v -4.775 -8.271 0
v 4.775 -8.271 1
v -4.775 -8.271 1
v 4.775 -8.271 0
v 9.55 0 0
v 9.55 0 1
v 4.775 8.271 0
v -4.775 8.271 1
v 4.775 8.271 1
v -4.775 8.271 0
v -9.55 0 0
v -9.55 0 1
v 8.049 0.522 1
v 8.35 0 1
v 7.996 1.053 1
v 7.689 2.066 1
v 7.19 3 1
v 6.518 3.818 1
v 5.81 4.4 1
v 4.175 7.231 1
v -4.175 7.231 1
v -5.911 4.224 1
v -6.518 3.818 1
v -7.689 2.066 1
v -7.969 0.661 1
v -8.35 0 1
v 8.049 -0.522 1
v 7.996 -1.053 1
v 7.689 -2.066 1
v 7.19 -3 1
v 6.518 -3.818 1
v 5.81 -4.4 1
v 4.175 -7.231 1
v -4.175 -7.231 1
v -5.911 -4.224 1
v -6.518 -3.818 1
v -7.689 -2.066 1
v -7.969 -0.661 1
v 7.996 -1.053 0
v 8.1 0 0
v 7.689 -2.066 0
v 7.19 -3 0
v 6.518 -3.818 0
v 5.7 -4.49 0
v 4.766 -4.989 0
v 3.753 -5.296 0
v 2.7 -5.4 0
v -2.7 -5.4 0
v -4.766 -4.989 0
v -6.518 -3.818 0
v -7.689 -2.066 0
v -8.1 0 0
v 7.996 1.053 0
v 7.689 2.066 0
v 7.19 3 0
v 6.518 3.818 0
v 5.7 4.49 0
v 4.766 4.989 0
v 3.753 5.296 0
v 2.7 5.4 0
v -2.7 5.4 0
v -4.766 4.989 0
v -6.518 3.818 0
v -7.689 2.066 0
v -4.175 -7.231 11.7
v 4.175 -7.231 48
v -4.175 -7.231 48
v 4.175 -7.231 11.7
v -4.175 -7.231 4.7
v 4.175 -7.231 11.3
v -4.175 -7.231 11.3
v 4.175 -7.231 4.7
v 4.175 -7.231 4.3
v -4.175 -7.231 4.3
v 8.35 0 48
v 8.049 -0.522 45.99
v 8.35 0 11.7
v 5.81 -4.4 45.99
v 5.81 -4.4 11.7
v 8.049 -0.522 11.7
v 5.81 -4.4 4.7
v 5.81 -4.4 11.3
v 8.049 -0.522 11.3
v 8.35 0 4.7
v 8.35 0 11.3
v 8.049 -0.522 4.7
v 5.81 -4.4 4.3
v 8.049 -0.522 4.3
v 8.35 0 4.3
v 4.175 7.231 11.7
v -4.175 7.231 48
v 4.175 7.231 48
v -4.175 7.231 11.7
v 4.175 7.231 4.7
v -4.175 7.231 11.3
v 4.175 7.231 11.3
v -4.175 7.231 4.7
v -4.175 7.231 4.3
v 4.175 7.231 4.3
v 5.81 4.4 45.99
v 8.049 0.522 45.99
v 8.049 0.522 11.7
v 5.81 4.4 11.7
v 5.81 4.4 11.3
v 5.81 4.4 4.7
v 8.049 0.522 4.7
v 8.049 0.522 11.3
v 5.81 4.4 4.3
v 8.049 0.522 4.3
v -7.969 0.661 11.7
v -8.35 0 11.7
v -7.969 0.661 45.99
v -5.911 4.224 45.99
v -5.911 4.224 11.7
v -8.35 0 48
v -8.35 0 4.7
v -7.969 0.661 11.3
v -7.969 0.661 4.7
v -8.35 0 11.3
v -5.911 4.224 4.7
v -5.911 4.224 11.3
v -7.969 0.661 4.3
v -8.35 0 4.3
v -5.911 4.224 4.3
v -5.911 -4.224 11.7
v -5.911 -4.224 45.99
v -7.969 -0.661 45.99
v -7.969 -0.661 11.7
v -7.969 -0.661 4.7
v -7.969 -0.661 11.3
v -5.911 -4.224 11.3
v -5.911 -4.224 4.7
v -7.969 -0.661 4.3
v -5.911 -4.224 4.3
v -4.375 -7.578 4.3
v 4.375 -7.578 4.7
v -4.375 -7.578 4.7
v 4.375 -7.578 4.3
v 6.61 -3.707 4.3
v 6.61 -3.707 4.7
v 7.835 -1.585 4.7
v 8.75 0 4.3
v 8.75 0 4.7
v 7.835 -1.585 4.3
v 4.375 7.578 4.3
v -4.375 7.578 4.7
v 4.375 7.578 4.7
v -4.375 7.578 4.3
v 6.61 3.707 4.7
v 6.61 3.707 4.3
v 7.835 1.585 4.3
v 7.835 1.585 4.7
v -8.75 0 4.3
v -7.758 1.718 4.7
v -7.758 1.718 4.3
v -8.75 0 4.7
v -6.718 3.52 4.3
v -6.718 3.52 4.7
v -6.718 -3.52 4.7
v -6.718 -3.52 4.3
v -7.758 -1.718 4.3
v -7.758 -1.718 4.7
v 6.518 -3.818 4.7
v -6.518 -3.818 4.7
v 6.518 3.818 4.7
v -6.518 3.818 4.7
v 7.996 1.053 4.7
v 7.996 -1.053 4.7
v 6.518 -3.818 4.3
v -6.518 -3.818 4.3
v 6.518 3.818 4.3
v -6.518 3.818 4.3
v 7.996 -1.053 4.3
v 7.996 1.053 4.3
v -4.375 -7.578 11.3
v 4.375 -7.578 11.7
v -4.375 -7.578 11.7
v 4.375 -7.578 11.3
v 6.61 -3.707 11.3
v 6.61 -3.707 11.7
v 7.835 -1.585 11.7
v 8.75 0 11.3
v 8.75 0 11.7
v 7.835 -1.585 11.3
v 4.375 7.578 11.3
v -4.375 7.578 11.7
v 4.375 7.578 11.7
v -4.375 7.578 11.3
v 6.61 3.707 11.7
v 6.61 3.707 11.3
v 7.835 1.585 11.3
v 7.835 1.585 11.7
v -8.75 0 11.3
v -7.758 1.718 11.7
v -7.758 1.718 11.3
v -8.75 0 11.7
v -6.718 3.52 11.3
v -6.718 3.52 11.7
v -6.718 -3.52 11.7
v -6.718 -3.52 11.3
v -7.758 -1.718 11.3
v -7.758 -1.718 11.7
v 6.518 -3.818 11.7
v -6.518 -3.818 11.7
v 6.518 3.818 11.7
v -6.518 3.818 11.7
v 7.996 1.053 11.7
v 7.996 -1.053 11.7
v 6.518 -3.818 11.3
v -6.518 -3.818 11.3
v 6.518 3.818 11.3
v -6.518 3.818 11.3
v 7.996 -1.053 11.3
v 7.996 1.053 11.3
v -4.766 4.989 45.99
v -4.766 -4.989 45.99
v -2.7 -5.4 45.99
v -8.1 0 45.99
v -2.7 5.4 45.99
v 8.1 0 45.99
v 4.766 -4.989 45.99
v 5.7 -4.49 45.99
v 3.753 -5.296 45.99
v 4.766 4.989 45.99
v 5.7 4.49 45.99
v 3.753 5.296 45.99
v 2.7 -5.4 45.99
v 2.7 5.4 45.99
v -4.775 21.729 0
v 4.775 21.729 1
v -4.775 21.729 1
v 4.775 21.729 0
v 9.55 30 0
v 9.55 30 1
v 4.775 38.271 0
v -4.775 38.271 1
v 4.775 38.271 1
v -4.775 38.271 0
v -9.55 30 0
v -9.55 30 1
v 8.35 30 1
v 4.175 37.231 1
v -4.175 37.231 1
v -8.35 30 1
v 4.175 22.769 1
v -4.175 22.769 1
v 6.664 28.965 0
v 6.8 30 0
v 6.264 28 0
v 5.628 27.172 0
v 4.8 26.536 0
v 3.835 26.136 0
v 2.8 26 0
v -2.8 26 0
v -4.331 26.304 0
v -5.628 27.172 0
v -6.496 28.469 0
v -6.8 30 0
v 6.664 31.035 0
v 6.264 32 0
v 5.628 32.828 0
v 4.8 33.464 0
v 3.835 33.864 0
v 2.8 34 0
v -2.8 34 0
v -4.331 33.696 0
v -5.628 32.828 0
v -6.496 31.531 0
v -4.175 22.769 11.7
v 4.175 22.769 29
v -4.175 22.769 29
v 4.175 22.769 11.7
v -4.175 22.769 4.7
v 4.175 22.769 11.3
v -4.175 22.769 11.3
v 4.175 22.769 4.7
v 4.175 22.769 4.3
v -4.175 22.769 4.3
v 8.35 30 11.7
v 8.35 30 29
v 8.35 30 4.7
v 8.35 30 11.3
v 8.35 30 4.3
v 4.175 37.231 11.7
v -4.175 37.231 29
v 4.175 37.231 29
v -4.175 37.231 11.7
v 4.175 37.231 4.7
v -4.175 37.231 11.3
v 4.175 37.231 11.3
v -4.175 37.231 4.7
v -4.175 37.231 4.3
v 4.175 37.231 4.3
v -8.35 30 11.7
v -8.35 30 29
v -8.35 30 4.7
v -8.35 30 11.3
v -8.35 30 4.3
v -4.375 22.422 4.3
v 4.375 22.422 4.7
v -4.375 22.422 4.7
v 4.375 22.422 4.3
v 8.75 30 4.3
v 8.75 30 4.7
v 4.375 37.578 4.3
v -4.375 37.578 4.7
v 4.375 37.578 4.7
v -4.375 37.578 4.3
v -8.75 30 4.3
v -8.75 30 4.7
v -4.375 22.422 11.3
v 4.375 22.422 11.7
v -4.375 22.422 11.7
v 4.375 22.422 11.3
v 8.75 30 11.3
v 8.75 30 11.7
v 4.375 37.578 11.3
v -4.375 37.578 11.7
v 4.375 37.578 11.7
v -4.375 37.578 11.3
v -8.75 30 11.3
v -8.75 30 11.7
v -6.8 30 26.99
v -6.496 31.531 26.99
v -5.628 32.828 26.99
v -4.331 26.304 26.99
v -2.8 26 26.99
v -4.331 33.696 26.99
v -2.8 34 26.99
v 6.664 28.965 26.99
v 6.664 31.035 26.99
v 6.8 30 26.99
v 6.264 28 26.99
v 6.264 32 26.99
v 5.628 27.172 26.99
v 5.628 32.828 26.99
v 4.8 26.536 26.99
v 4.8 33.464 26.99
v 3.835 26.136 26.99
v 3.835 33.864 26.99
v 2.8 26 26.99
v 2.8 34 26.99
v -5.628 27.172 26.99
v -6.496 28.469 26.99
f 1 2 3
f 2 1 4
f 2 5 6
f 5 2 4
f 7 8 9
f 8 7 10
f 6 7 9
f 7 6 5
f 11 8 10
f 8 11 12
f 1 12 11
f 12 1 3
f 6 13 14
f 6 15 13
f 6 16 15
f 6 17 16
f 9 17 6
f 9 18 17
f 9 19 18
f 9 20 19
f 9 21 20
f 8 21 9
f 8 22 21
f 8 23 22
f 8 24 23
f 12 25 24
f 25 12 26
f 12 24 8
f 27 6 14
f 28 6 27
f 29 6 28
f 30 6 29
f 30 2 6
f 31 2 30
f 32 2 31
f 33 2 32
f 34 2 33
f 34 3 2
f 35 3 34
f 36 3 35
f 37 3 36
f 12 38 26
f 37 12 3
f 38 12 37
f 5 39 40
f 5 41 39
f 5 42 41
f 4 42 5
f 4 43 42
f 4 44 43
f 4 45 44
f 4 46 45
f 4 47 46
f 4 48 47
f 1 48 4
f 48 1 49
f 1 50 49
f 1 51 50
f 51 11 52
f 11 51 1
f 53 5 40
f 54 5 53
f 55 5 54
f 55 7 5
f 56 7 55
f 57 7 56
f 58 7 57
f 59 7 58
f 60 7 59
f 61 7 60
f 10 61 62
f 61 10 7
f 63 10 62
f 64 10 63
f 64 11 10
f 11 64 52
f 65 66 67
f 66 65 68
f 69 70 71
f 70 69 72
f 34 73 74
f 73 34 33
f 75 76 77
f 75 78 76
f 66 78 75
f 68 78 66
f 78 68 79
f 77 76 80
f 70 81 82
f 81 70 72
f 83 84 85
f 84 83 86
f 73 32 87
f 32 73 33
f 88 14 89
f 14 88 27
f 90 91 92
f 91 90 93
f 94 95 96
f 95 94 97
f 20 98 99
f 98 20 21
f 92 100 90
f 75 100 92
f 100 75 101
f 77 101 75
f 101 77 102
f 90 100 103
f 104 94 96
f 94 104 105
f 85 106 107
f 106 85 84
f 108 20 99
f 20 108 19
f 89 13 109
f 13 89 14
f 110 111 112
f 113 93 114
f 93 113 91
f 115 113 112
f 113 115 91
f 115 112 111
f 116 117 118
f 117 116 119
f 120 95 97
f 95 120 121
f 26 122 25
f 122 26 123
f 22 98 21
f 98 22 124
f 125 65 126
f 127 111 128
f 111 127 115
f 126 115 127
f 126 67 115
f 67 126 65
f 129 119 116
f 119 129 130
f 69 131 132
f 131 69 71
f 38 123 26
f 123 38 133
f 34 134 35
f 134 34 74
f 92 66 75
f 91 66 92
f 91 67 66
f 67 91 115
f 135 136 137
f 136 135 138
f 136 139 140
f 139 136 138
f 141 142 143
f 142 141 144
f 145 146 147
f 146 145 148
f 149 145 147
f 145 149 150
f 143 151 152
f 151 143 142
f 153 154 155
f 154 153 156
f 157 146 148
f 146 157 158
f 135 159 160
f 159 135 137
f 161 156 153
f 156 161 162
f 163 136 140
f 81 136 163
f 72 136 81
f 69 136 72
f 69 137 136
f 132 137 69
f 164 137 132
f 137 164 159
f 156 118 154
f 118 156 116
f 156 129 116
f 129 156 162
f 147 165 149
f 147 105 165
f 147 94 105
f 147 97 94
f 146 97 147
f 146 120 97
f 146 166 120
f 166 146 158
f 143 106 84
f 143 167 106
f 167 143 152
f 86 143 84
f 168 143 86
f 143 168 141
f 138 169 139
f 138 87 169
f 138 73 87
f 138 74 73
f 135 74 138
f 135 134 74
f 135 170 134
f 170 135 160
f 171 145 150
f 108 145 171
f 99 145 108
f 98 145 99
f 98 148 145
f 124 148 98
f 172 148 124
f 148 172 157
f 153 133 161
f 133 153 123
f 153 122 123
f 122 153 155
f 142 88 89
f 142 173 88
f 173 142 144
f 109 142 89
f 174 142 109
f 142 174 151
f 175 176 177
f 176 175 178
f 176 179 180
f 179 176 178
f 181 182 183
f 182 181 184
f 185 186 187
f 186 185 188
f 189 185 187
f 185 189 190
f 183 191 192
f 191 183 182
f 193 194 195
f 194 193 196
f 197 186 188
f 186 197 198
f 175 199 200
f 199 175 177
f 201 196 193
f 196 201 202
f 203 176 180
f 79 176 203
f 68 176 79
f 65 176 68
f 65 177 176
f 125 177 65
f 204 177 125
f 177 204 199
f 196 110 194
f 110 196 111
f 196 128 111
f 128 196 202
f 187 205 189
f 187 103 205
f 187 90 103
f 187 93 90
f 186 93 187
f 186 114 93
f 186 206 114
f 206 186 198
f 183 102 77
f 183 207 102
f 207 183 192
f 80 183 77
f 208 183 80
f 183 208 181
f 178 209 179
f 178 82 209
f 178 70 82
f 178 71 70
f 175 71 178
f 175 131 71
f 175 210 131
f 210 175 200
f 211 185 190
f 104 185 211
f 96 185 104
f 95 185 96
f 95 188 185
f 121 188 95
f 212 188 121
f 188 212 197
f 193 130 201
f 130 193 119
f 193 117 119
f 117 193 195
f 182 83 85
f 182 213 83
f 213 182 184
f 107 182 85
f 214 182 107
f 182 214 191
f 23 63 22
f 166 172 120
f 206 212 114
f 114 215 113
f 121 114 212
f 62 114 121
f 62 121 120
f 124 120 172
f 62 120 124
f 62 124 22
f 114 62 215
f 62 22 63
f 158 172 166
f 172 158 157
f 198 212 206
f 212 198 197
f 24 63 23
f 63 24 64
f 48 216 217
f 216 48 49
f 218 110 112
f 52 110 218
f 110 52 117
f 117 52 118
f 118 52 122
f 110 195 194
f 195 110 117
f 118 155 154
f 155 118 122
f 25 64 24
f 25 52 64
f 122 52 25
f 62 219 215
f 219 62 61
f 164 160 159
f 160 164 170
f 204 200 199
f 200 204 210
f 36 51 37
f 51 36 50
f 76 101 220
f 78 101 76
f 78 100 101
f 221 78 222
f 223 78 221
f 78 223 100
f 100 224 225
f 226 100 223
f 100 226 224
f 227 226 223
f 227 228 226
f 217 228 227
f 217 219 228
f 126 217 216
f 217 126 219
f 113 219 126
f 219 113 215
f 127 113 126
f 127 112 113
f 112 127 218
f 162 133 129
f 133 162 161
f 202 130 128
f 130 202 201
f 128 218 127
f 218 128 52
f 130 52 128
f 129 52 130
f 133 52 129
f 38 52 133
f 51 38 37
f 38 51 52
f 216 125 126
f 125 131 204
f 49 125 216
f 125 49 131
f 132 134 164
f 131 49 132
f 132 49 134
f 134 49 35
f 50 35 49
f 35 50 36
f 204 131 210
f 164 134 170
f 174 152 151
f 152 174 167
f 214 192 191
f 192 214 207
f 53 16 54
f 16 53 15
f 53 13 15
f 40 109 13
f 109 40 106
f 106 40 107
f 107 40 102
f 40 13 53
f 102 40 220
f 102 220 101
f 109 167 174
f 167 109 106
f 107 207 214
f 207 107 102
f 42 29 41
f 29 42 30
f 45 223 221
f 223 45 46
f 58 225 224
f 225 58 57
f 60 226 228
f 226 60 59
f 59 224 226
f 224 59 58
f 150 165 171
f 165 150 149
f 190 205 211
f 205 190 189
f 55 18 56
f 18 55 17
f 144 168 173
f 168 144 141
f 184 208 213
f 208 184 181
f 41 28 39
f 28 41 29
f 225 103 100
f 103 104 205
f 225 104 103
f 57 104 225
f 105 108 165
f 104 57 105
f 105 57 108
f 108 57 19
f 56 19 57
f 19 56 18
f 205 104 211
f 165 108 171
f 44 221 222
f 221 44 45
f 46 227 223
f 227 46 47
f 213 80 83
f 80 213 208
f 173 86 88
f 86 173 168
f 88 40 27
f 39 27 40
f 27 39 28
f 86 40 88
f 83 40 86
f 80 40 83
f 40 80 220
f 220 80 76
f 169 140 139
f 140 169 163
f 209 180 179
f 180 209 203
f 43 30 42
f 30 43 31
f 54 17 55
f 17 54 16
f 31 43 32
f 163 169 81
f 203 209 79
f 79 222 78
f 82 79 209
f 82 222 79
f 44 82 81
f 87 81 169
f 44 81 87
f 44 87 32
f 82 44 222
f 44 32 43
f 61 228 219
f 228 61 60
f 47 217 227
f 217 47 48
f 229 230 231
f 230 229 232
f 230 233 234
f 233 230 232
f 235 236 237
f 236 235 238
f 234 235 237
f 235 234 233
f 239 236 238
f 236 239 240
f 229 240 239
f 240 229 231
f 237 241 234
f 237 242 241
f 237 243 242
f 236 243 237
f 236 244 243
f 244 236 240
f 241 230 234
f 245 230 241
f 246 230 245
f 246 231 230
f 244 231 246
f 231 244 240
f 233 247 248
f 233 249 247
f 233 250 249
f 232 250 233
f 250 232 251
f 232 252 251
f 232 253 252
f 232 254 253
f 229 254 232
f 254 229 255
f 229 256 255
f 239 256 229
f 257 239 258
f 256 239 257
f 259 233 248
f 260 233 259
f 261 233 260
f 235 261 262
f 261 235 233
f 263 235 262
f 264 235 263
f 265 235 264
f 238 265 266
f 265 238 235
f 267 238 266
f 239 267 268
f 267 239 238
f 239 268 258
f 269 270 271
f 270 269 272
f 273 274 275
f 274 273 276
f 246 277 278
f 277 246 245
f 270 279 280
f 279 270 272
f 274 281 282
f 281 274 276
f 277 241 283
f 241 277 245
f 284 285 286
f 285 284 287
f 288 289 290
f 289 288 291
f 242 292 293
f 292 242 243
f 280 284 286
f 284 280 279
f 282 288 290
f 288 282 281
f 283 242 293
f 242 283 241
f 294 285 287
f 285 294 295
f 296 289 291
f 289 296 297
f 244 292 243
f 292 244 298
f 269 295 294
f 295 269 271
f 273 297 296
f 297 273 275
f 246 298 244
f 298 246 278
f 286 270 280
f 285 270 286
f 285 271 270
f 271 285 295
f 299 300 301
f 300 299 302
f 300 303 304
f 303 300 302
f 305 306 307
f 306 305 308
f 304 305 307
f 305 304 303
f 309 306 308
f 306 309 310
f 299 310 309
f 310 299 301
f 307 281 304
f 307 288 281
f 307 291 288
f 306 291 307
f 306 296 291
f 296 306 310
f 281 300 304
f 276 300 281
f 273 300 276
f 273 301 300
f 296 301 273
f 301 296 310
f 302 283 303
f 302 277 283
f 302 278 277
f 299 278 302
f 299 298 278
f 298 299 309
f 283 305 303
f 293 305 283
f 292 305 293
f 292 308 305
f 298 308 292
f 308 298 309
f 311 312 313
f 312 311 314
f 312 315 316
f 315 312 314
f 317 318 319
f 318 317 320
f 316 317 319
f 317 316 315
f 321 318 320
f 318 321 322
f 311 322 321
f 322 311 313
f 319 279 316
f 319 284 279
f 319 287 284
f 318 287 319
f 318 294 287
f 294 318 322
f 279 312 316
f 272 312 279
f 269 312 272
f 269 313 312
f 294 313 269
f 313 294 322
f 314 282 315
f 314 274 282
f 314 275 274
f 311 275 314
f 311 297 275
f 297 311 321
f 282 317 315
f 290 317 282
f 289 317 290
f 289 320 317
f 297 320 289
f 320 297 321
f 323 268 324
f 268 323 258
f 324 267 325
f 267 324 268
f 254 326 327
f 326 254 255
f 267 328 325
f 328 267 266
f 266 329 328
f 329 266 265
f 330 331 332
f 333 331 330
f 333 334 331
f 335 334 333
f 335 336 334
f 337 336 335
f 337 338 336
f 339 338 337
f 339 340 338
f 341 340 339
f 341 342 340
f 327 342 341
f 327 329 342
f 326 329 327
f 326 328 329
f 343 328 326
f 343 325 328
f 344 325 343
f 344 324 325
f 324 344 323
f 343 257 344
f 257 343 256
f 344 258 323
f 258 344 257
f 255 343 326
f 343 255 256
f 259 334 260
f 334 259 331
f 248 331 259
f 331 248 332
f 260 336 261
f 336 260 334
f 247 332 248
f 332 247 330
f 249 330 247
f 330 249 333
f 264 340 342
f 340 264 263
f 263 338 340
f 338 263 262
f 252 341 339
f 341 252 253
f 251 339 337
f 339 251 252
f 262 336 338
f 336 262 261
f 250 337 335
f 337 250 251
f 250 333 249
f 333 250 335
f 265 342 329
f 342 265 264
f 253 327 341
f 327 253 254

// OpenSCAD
// StarLink Extras for Spool cable wire winder v2.4
// Written by Sayko R. <roman.sayko@gmail.com>

use <threads.scad>


// Diameter of the hole of spool
hole_diameter = 35.0;

//Thickness of the wall
wall_thickness = 3.5;
//before final render set it to 24, for debugging 6 is ok
render_quality = 6;//[1:24]
//Diameter of the printer's nozzle, also used for tollerance
nozzle_diameter = 0.4; 

difference() {
    //translate([5.4/1.5,0,0])
    SWTool_long(48);
    translate([-5.4/2,0,-0.01])
   Slot(5.4,5.4,46);
}


translate([0,30,0])
difference() {
    //translate([13/4,0,0])
    SWTool_long(29);
    translate([-5.6/2,0,-0.01])
   Slot(4,5.6,27);
}

module SWTool_long(height){
    cylinder(h=1,
              r=(hole_diameter / 2) /2 + nozzle_diameter*2, $fn=6,
              center=false);
    cylinder(h=height,
              r=(hole_diameter / 2) /2 - nozzle_diameter, $fn=6,
              center=false);
    translate([0,0,wall_thickness + nozzle_diameter*2])
    cylinder(h=nozzle_diameter,
              r=(hole_diameter / 2) /2, $fn=6,
              center=false);
    translate([0,0,wall_thickness*3 + nozzle_diameter*2])
    cylinder(h=nozzle_diameter,
              r=(hole_diameter / 2) /2, $fn=6,
              center=false);
    //cube([hole_diameter/4-1,hole_diameter/2-3,nozzle_diameter*2], center = true);
}

module Slot(r=10, d=15, h=50){
    cylinder(h=h, r=r, $fn=render_quality*d/2, center=false);
    translate([d,0,0])
    cylinder(h=h, r=r, $fn=render_quality*r, center=false);
    translate([0,-r,0])
    cube([d, r*2, h], center = false);
}
